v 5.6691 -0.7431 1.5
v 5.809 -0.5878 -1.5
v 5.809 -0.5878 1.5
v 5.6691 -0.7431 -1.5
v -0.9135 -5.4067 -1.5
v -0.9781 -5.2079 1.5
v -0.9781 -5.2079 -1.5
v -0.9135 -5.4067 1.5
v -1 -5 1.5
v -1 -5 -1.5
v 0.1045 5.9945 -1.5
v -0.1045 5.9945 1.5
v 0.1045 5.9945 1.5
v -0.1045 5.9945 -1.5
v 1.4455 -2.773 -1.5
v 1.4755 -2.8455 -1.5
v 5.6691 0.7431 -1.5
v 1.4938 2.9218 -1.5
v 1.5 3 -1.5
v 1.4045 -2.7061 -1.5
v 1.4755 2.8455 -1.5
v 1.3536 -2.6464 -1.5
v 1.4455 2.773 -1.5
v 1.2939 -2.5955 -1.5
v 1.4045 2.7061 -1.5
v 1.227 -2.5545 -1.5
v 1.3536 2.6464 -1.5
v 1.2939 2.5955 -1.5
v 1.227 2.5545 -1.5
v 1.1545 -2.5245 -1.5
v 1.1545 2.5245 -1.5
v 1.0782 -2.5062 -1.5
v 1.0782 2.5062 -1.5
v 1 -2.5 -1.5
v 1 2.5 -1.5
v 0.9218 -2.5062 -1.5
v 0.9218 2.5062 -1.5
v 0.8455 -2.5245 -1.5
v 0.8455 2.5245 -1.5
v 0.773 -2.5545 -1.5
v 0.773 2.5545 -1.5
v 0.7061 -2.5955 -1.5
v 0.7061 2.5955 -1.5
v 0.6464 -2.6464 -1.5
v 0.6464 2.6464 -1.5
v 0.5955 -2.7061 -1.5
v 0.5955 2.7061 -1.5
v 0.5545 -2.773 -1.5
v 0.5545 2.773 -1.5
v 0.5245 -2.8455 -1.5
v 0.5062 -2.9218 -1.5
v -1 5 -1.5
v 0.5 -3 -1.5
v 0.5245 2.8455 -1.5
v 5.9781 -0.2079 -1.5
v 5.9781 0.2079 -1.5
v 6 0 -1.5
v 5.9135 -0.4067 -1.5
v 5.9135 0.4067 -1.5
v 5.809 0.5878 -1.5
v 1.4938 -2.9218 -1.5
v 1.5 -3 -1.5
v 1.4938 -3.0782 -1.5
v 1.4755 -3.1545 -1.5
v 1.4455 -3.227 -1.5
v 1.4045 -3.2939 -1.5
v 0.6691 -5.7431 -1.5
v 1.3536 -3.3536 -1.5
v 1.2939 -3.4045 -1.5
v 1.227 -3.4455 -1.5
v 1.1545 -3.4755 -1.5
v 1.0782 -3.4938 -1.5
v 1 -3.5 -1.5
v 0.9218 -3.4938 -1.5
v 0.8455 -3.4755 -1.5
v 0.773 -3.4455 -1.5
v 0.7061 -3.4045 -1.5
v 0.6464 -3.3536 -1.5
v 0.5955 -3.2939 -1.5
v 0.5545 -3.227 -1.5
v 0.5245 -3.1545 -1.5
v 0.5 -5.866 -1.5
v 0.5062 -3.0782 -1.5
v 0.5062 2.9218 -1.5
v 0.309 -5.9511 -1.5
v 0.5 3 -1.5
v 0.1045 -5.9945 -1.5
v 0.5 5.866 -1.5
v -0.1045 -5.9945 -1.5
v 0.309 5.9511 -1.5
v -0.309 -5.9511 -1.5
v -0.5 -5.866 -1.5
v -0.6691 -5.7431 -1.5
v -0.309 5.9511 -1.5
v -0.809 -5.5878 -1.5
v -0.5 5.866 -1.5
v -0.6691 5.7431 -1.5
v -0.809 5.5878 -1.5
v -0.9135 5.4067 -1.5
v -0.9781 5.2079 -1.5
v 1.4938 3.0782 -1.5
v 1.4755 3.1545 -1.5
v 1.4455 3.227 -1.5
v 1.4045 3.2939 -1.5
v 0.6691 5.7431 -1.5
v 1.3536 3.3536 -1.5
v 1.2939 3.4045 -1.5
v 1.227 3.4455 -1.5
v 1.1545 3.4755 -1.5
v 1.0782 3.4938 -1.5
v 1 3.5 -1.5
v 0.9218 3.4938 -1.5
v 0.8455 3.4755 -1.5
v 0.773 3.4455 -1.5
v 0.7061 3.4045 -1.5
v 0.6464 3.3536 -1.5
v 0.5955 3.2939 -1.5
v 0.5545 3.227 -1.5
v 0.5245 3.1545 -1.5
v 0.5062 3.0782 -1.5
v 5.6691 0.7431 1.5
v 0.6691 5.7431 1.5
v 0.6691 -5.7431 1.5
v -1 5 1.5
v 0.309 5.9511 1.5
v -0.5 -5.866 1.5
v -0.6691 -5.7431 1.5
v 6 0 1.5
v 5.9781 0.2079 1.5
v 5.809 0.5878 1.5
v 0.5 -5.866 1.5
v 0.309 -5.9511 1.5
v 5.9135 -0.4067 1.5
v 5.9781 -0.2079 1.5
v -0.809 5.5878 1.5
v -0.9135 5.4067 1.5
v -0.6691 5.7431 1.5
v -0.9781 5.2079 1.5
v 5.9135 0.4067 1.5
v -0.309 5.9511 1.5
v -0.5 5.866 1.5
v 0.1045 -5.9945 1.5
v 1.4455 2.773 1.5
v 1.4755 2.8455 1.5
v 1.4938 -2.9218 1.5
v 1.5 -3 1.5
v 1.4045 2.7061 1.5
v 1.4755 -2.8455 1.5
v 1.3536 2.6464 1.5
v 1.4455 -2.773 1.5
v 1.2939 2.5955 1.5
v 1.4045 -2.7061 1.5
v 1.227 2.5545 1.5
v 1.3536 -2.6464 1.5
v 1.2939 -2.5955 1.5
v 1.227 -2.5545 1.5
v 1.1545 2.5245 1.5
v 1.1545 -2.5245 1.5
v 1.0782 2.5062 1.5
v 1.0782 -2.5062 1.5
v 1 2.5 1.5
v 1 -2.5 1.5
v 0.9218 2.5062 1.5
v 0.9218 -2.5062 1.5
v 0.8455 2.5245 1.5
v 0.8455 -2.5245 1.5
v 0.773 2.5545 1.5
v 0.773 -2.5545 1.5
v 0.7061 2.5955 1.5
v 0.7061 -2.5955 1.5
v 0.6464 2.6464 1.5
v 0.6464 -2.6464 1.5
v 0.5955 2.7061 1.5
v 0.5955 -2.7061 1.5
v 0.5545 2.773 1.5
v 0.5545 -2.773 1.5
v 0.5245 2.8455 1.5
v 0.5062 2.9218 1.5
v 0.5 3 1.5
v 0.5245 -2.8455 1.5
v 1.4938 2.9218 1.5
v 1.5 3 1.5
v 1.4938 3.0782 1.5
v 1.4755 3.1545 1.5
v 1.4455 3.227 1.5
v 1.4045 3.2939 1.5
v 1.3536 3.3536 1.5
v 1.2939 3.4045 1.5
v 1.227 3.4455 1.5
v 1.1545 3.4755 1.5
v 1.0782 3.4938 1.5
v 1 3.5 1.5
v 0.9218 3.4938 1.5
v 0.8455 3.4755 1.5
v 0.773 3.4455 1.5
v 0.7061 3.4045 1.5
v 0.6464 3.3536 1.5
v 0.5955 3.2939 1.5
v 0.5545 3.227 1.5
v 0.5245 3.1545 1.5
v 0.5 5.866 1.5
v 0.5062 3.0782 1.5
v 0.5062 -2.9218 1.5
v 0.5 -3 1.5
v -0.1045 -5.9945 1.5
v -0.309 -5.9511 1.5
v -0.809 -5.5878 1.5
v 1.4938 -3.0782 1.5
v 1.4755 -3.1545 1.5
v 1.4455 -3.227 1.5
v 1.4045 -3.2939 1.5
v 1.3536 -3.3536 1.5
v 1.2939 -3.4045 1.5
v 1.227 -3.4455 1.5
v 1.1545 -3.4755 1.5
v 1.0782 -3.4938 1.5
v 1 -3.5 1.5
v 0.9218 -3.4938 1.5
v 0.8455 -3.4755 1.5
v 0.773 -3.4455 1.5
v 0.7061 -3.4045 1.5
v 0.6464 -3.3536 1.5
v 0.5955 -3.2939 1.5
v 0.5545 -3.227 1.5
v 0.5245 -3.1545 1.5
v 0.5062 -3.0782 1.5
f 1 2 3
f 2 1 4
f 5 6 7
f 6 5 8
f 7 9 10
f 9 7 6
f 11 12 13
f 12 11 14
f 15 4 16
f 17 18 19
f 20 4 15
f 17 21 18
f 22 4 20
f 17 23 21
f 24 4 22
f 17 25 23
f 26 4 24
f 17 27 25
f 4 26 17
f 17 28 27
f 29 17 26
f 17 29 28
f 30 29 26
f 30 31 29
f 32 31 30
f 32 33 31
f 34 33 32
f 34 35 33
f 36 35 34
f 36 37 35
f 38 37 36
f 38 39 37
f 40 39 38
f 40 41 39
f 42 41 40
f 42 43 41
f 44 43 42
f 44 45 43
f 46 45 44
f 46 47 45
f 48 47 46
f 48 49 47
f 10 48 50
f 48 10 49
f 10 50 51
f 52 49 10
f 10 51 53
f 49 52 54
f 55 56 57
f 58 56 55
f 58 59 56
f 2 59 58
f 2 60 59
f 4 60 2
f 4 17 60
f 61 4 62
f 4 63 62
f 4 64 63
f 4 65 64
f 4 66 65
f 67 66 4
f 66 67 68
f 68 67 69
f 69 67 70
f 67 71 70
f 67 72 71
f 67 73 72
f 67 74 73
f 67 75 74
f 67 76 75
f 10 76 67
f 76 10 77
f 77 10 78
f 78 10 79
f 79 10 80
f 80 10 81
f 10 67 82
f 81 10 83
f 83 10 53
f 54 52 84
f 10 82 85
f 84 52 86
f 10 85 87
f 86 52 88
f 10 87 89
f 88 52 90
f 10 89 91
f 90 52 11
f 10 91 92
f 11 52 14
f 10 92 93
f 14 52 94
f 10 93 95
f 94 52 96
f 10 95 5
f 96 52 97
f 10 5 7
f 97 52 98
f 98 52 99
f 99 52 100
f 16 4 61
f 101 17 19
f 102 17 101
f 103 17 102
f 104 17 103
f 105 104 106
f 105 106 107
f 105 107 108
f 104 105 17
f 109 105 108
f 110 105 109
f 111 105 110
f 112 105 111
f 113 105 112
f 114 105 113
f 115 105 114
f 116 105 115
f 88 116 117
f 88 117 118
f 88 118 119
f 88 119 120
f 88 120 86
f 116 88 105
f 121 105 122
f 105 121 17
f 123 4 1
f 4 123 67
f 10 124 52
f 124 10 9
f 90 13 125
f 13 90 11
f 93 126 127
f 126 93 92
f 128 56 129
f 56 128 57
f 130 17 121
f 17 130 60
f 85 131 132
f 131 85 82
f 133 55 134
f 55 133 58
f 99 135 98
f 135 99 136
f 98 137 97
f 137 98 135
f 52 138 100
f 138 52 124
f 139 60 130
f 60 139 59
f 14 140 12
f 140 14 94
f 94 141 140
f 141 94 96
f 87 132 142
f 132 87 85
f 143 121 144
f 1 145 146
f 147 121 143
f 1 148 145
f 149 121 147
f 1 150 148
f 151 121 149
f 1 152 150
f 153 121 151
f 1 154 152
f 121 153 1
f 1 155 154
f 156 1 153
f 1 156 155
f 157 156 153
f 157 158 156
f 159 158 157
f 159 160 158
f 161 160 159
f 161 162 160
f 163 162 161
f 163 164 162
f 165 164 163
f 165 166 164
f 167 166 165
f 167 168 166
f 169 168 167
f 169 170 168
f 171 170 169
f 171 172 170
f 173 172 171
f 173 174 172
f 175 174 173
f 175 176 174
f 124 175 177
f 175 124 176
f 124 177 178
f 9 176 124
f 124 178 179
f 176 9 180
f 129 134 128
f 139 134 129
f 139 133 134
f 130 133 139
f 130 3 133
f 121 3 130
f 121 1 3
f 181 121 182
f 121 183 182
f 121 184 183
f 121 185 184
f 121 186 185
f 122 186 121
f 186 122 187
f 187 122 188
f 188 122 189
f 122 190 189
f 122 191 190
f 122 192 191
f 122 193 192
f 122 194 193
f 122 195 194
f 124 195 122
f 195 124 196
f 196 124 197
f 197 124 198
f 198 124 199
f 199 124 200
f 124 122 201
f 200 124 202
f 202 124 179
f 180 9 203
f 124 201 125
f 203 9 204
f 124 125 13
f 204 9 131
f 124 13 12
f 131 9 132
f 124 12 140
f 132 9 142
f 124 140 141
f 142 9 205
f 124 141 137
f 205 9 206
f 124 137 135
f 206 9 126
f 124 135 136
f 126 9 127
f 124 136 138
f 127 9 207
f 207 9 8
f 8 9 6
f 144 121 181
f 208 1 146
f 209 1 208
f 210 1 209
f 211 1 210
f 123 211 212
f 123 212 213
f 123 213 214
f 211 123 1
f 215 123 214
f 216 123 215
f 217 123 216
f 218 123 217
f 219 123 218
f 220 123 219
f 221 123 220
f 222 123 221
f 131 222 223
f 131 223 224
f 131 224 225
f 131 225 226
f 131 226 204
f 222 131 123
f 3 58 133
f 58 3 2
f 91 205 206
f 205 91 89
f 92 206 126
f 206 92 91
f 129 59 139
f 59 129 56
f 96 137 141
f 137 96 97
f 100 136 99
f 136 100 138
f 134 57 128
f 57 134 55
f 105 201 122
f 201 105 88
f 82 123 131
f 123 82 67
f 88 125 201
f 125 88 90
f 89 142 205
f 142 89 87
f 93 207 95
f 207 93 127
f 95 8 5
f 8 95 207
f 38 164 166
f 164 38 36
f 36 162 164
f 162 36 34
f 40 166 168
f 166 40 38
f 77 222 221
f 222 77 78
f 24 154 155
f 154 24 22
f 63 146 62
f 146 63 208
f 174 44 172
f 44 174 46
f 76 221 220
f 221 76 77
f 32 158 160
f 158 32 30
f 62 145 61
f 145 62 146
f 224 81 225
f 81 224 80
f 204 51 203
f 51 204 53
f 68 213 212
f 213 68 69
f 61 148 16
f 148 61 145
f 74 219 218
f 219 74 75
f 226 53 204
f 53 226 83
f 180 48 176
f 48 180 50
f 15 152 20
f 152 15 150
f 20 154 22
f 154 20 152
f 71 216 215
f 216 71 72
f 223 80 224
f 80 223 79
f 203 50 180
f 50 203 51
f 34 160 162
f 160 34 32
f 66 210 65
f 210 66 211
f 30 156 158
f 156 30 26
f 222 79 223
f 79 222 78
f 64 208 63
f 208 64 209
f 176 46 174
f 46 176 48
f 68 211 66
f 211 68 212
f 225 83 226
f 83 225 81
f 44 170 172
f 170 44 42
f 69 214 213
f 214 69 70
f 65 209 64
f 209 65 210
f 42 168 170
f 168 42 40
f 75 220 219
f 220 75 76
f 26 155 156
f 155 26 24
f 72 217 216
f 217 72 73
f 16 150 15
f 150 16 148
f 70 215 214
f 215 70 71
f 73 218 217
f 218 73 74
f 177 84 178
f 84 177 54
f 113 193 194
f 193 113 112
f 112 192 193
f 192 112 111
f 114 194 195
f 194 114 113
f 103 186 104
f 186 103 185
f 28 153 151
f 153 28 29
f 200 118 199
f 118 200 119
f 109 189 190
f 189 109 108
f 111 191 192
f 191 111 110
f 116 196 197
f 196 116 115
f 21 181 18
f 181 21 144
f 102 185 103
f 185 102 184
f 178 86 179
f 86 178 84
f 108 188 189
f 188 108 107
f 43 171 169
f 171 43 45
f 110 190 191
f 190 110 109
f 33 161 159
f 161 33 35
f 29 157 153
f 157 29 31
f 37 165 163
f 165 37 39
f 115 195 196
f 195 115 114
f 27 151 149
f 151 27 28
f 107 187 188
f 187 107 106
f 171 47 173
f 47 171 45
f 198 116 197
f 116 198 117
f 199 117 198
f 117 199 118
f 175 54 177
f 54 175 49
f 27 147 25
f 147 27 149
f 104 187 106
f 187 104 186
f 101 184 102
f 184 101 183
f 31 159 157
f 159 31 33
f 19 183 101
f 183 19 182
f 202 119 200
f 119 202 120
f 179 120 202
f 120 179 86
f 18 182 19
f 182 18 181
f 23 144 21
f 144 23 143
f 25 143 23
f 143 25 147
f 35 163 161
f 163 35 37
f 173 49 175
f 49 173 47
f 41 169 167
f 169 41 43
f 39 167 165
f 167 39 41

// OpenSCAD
module Mech_Piece_01(){

color("#a8b0b2")
union(){
    translate([0,0,0])
    cylinder(3,0.5,0.5, $fn=40, center=true);
}
}

difference(){

linear_extrude(height=3, center=true)
hull(){
translate([5,0,0])
circle(r = 1, $fn = 30);

translate([0,5,0])
circle(r = 1, $fn = 30);

translate([0,-5,0])
circle(r = 1, $fn = 30);

}


translate([1,-3,0]){
rotate([0,0,90])
Mech_Piece_01();
}

translate([1,3,0]){
rotate([0,0,90])
Mech_Piece_01();
}

}


// Written by Nicolì Angelo (Gengio) 2024: 
// MIT License

//Permission is hereby granted, free of charge, to any person obtaining a copy of this software and associated documentation files (the "Software"), to deal in the Software without restriction, including without limitation the rights to use, copy, modify, merge, publish, distribute, sublicense, and/or sell copies of the Software, and to permit persons to whom the Software is furnished to do so, subject to the following conditions:

//The above copyright notice and this permission notice shall be included in all copies or substantial portions of the Software.

//THE SOFTWARE IS PROVIDED "AS IS", WITHOUT WARRANTY OF ANY KIND, EXPRESS OR IMPLIED, INCLUDING BUT NOT LIMITED TO THE WARRANTIES OF MERCHANTABILITY, FITNESS FOR A PARTICULAR PURPOSE AND NONINFRINGEMENT. IN NO EVENT SHALL THE AUTHORS OR COPYRIGHT HOLDERS BE LIABLE FOR ANY CLAIM, DAMAGES OR OTHER LIABILITY, WHETHER IN AN ACTION OF CONTRACT, TORT OR OTHERWISE, ARISING FROM, OUT OF OR IN CONNECTION WITH THE SOFTWARE OR THE USE OR OTHER DEALINGS IN THE SOFTWARE.
